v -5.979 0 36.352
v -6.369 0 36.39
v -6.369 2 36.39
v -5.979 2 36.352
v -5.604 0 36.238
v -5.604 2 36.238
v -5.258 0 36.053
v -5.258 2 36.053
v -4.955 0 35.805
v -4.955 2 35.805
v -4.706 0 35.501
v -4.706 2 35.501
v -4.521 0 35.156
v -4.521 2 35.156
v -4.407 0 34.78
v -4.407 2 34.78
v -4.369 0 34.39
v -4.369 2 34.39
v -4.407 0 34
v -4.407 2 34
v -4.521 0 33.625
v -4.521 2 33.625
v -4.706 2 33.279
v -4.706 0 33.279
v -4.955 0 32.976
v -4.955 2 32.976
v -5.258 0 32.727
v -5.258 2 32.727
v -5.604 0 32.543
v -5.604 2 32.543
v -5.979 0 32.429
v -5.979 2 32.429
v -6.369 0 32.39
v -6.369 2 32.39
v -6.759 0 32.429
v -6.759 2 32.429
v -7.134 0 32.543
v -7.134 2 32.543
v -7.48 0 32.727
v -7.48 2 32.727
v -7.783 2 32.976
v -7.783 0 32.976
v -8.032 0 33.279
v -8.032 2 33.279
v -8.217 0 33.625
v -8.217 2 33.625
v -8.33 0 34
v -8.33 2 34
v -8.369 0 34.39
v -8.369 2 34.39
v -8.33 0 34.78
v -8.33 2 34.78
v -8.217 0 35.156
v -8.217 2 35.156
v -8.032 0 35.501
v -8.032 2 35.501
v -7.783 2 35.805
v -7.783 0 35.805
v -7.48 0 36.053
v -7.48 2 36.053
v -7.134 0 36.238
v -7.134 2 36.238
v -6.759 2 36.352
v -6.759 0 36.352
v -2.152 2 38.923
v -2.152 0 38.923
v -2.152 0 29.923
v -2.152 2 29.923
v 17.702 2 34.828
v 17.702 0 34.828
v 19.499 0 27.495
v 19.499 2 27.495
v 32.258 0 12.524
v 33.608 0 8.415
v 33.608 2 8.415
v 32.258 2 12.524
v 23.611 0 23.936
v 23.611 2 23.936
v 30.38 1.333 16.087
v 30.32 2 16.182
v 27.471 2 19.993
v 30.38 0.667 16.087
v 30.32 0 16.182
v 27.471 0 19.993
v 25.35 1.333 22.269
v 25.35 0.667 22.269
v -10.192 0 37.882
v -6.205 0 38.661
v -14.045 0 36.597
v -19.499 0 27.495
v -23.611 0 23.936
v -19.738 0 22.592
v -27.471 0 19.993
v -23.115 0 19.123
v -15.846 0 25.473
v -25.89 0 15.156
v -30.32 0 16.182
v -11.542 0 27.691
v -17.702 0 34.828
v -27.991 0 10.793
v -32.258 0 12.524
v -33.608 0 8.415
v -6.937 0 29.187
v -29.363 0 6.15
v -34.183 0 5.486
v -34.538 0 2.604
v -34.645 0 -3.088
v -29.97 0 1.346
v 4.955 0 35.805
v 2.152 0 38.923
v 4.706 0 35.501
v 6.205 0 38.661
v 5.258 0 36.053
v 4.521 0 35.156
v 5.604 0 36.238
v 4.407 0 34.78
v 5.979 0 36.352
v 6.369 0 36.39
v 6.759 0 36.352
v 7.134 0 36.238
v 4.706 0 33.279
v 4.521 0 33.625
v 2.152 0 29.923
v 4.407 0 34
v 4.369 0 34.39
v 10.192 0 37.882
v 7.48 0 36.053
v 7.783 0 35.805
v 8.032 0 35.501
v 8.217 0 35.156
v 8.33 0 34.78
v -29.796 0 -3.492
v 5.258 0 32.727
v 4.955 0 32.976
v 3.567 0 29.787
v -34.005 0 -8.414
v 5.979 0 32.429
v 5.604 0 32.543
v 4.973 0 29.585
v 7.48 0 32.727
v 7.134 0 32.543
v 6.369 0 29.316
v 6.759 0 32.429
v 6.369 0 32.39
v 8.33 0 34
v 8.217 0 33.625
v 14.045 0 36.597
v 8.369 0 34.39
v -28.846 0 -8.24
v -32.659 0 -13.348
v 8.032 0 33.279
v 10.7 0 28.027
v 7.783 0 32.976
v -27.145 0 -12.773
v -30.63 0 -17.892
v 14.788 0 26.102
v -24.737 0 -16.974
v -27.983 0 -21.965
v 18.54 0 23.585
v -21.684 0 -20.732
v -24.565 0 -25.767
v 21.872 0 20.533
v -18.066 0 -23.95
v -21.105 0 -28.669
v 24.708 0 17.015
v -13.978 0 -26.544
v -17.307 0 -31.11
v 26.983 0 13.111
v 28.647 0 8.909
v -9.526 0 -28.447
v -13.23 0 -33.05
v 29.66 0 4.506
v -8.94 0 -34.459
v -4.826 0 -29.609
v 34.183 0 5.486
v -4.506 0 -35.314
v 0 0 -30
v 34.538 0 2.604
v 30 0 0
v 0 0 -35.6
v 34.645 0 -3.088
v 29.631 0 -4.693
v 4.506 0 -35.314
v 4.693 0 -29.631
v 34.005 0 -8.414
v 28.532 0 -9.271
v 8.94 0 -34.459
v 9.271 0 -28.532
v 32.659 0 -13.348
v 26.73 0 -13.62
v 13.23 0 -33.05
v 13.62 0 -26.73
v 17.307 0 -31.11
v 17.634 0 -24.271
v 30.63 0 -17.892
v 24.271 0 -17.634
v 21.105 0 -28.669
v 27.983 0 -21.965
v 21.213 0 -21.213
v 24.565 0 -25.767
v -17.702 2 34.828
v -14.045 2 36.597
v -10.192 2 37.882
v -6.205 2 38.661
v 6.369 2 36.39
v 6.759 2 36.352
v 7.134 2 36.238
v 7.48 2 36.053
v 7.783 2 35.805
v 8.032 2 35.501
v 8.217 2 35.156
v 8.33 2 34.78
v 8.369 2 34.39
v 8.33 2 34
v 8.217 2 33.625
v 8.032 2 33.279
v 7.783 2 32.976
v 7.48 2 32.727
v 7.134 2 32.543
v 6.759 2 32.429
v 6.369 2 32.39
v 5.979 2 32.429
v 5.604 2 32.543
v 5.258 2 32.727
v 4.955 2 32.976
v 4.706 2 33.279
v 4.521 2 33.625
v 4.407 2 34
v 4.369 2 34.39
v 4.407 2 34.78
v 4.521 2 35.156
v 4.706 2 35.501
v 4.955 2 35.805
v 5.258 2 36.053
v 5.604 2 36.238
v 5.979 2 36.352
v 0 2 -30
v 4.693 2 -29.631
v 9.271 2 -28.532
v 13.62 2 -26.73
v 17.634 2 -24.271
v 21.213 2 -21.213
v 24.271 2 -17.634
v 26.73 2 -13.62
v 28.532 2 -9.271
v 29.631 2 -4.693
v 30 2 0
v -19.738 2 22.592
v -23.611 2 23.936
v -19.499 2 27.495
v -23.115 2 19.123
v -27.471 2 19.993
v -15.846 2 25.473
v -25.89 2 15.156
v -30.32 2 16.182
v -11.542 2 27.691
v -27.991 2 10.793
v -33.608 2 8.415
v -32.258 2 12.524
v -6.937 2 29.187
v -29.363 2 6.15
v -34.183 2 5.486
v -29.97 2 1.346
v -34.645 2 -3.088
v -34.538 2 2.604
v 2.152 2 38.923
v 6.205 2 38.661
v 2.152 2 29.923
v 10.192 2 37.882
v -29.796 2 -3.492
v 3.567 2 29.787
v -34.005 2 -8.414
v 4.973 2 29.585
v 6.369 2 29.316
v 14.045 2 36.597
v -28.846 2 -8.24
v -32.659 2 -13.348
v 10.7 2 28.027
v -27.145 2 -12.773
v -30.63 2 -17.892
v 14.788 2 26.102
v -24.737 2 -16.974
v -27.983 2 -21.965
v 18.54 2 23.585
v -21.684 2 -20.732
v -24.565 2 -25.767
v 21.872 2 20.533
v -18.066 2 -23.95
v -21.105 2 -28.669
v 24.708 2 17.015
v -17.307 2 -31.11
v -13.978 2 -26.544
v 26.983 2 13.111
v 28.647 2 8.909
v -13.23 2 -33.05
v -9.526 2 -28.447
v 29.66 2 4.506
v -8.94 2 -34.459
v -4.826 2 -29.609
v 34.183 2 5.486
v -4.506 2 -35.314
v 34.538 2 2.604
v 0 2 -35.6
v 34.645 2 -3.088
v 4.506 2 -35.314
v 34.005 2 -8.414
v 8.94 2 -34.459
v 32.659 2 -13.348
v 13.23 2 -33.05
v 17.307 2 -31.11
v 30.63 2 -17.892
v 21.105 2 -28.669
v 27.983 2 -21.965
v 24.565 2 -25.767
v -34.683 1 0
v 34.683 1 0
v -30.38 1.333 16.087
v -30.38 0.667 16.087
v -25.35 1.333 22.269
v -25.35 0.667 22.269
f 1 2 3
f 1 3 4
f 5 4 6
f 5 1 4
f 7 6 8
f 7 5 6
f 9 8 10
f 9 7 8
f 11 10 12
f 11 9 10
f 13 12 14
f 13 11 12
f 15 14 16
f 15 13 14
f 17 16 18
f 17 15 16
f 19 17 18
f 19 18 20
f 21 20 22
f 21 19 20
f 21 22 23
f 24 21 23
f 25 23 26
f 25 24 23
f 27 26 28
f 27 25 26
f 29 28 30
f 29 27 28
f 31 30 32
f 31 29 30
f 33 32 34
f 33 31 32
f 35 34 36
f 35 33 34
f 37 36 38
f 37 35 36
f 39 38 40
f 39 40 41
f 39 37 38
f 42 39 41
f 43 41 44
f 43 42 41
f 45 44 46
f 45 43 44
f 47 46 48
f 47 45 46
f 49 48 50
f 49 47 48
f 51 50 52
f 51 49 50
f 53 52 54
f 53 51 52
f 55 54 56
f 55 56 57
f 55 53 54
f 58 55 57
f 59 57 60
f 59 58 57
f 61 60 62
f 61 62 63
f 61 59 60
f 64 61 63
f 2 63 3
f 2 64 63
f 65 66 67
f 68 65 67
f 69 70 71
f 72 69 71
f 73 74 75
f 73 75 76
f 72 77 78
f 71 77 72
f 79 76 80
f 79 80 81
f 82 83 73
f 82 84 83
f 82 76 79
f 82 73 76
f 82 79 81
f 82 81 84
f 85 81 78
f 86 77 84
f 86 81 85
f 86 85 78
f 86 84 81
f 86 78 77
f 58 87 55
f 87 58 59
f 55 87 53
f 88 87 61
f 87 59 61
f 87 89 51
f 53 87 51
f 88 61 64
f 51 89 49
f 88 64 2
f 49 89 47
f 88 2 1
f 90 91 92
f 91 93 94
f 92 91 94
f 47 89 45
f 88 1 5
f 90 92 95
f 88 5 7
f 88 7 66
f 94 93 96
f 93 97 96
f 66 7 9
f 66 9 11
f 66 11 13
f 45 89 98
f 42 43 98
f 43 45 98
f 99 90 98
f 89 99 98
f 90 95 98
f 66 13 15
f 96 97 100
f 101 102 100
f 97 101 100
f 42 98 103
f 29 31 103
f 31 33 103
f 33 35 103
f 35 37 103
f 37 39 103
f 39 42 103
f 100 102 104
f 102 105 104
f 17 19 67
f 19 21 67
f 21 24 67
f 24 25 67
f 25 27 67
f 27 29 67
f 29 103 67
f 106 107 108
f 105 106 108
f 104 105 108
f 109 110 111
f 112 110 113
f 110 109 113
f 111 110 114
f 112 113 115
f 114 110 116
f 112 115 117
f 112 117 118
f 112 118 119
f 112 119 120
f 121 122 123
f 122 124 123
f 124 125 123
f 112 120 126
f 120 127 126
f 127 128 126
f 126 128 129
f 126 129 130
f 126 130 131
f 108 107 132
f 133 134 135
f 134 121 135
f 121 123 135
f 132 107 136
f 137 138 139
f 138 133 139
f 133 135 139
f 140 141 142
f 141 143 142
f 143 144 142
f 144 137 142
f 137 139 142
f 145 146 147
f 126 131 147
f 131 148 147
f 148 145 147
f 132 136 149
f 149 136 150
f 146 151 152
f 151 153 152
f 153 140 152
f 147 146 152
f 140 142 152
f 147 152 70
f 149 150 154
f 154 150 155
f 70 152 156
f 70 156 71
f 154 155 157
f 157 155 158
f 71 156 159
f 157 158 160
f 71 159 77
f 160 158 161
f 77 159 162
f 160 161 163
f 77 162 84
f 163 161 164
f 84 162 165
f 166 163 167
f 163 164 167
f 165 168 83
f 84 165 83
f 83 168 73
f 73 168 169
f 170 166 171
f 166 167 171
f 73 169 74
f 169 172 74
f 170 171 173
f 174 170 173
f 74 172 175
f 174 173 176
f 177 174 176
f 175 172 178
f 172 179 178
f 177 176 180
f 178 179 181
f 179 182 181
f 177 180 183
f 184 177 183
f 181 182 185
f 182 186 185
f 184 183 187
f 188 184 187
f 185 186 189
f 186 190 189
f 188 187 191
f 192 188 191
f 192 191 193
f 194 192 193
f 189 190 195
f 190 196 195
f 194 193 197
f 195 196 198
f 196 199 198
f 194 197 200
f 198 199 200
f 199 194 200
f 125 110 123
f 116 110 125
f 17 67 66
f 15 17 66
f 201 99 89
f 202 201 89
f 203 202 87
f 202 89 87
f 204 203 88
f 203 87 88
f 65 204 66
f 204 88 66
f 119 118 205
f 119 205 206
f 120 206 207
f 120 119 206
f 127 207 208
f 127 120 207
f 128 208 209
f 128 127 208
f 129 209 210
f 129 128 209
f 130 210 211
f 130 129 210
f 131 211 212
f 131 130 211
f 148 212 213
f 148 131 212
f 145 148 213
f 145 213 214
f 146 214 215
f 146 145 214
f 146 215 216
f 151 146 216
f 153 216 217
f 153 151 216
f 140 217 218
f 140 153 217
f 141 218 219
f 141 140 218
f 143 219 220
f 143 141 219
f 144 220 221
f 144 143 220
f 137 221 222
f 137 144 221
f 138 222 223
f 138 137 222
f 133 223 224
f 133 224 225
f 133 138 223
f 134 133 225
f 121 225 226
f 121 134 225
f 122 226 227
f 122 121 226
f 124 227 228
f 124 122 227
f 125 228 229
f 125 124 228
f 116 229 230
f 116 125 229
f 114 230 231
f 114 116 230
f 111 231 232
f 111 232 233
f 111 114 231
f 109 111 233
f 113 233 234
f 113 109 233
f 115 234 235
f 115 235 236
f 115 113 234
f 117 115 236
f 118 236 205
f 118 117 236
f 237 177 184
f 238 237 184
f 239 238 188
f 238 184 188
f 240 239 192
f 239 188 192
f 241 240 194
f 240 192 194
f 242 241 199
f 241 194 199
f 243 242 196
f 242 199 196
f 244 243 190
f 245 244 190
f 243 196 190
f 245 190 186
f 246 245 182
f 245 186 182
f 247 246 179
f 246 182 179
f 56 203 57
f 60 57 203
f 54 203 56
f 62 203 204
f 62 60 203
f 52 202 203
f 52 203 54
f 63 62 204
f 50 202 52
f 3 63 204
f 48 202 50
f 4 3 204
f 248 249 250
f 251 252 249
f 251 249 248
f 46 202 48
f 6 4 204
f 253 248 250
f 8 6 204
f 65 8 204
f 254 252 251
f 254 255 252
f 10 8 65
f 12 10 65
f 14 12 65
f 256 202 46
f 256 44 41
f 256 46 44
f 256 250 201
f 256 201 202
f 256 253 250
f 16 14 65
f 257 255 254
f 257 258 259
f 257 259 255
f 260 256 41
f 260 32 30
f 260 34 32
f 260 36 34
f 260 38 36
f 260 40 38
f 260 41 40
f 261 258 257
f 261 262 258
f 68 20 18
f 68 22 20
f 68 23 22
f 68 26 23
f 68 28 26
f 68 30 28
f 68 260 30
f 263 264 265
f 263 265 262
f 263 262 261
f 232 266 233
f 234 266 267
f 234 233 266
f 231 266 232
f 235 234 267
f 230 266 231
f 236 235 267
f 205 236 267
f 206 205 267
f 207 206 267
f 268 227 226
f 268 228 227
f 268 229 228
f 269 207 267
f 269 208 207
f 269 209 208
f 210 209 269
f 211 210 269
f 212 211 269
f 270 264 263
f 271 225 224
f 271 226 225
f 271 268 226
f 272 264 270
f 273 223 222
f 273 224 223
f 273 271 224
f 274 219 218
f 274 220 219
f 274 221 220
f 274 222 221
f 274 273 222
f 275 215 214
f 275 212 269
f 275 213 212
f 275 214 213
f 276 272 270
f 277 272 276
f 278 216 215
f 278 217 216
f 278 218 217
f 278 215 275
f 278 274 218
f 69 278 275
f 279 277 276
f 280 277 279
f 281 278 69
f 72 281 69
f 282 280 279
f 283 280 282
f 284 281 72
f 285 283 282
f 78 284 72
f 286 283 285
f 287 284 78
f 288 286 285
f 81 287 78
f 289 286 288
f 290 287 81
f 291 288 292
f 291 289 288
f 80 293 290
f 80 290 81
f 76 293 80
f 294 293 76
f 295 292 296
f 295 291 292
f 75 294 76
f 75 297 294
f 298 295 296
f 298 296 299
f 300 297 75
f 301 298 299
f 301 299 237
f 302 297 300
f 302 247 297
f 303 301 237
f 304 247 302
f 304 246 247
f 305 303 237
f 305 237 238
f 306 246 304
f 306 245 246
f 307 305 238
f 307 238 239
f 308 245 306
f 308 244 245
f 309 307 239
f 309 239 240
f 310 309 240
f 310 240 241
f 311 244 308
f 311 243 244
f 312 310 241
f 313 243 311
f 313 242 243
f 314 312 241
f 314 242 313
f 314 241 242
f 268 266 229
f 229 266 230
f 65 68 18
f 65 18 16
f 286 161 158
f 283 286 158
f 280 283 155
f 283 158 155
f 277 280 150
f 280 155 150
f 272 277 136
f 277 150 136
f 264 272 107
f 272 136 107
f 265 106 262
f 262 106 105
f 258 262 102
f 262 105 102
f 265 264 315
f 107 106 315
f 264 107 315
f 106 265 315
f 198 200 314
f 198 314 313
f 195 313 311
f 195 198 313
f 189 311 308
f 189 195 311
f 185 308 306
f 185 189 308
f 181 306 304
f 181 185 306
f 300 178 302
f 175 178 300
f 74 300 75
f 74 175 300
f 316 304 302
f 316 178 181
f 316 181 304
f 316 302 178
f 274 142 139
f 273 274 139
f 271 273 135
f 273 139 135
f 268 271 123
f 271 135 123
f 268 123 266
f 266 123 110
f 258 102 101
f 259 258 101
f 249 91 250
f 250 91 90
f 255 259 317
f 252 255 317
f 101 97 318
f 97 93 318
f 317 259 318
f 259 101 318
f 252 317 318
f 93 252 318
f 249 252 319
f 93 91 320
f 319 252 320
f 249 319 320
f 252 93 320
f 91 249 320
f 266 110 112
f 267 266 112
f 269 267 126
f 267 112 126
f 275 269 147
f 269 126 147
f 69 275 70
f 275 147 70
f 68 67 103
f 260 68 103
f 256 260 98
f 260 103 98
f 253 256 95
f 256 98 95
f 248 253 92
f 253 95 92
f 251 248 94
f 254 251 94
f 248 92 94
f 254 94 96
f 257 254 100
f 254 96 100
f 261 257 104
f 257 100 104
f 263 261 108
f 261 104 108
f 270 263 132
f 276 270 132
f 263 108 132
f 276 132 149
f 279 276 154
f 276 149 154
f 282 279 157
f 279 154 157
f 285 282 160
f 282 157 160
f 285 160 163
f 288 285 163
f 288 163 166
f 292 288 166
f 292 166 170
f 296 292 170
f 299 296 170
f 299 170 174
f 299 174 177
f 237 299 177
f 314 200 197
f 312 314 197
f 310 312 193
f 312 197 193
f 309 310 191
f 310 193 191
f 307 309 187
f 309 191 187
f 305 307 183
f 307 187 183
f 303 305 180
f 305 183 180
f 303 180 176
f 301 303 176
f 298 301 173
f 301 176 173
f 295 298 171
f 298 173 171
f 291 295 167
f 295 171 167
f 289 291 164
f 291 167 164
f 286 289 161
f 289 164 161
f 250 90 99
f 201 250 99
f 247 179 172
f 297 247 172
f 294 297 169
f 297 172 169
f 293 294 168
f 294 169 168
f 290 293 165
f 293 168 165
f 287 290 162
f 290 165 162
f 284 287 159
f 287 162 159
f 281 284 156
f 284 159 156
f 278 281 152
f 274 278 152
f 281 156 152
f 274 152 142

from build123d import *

# Parameters (mm, degrees)
IZIM1_R                     = 2
Y_KSEKLIK_EKSTR_ZYON1_DEPTH = 2


with BuildPart() as part:
    # Çizim1 → Yükseklik-Ekstrüzyon1 (new body)
    # profile 1 of 2: a face of its own
    with BuildSketch(Plane(origin=(0, 0, 0), x_dir=(1, 0, 0), z_dir=(0, 1, 0))):
        with BuildLine():
            Line((-2.151853537, -38.922725918), (-2.151853537, -29.922725918))
            ThreePointArc((-2.151853537, -29.922725918), (-29.980675255, 1.076620282), (0, 30))
            Line((0, 30), (0, 35.6))
            ThreePointArc((0, 35.6), (-13.229776272, 33.050461718), (-24.564618776, 25.767023584))
            add(Edge.make_bspline(
                [(-24.564618776, 25.767023584), (-32.251007767, 18.439315954), (-35.719007685, 6.21673721), (-34.276517941, -5.541694008), (-33.608104639, -8.414682353)],
                knots=[0, 0, 0, 0, 0.765438226, 1, 1, 1, 1], degree=3))
            add(Edge.make_bspline(
                [(-33.608104639, -8.414682353), (-31.608167264, -17.010855942), (-25.43277753, -22.569195675), (-19.499413864, -27.49500702)],
                knots=[0, 0, 0, 0, 1, 1, 1, 1], degree=3))
            Line((-19.499413864, -27.49500702), (-17.70199444, -34.827578129))
            ThreePointArc((-17.70199444, -34.827578129), (-10.192020163, -37.881778178), (-2.151853537, -38.922725918))
        make_face()
        with Locations(Location((-6.368896391, -34.390315296, 0), (0, 0, 270))):
            Circle(IZIM1_R, mode=Mode.SUBTRACT)
    # profile 2 of 2: a face of its own
    with BuildSketch(Plane(origin=(0, 0, 0), x_dir=(1, 0, 0), z_dir=(0, 1, 0))):
        with BuildLine():
            ThreePointArc((6.368896391, -29.316158663), (4.271156259, -29.694397185), (2.151853537, -29.922725918))
            Line((2.151853537, -29.922725918), (2.151853537, -38.922725918))
            ThreePointArc((2.151853537, -38.922725918), (10.192020163, -37.881778178), (17.70199444, -34.827578129))
            Line((17.70199444, -34.827578129), (19.499413864, -27.49500702))
            add(Edge.make_bspline(
                [(33.608104639, -8.414682353), (31.608167264, -17.010855942), (25.43277753, -22.569195675), (19.499413864, -27.49500702)],
                knots=[0, 0, 0, 0, 1, 1, 1, 1], degree=3))
            add(Edge.make_bspline(
                [(24.564618776, 25.767023584), (32.251007767, 18.439315954), (35.719007685, 6.21673721), (34.276517941, -5.541694008), (33.608104639, -8.414682353)],
                knots=[0, 0, 0, 0, 0.765438226, 1, 1, 1, 1], degree=3))
            ThreePointArc((24.564618776, 25.767023584), (13.229776272, 33.050461718), (0, 35.6))
            Line((0, 35.6), (0, 30))
            ThreePointArc((0, 30), (21.213203436, 21.213203436), (30, 0))
            ThreePointArc((30, 0), (23.356657421, -18.827282176), (6.368896391, -29.316158663))
        make_face()
        with Locations(Location((6.368896391, -34.390315296, 0), (0, 0, 270))):
            Circle(IZIM1_R, mode=Mode.SUBTRACT)
    extrude(amount=Y_KSEKLIK_EKSTR_ZYON1_DEPTH)


solid = part.part
